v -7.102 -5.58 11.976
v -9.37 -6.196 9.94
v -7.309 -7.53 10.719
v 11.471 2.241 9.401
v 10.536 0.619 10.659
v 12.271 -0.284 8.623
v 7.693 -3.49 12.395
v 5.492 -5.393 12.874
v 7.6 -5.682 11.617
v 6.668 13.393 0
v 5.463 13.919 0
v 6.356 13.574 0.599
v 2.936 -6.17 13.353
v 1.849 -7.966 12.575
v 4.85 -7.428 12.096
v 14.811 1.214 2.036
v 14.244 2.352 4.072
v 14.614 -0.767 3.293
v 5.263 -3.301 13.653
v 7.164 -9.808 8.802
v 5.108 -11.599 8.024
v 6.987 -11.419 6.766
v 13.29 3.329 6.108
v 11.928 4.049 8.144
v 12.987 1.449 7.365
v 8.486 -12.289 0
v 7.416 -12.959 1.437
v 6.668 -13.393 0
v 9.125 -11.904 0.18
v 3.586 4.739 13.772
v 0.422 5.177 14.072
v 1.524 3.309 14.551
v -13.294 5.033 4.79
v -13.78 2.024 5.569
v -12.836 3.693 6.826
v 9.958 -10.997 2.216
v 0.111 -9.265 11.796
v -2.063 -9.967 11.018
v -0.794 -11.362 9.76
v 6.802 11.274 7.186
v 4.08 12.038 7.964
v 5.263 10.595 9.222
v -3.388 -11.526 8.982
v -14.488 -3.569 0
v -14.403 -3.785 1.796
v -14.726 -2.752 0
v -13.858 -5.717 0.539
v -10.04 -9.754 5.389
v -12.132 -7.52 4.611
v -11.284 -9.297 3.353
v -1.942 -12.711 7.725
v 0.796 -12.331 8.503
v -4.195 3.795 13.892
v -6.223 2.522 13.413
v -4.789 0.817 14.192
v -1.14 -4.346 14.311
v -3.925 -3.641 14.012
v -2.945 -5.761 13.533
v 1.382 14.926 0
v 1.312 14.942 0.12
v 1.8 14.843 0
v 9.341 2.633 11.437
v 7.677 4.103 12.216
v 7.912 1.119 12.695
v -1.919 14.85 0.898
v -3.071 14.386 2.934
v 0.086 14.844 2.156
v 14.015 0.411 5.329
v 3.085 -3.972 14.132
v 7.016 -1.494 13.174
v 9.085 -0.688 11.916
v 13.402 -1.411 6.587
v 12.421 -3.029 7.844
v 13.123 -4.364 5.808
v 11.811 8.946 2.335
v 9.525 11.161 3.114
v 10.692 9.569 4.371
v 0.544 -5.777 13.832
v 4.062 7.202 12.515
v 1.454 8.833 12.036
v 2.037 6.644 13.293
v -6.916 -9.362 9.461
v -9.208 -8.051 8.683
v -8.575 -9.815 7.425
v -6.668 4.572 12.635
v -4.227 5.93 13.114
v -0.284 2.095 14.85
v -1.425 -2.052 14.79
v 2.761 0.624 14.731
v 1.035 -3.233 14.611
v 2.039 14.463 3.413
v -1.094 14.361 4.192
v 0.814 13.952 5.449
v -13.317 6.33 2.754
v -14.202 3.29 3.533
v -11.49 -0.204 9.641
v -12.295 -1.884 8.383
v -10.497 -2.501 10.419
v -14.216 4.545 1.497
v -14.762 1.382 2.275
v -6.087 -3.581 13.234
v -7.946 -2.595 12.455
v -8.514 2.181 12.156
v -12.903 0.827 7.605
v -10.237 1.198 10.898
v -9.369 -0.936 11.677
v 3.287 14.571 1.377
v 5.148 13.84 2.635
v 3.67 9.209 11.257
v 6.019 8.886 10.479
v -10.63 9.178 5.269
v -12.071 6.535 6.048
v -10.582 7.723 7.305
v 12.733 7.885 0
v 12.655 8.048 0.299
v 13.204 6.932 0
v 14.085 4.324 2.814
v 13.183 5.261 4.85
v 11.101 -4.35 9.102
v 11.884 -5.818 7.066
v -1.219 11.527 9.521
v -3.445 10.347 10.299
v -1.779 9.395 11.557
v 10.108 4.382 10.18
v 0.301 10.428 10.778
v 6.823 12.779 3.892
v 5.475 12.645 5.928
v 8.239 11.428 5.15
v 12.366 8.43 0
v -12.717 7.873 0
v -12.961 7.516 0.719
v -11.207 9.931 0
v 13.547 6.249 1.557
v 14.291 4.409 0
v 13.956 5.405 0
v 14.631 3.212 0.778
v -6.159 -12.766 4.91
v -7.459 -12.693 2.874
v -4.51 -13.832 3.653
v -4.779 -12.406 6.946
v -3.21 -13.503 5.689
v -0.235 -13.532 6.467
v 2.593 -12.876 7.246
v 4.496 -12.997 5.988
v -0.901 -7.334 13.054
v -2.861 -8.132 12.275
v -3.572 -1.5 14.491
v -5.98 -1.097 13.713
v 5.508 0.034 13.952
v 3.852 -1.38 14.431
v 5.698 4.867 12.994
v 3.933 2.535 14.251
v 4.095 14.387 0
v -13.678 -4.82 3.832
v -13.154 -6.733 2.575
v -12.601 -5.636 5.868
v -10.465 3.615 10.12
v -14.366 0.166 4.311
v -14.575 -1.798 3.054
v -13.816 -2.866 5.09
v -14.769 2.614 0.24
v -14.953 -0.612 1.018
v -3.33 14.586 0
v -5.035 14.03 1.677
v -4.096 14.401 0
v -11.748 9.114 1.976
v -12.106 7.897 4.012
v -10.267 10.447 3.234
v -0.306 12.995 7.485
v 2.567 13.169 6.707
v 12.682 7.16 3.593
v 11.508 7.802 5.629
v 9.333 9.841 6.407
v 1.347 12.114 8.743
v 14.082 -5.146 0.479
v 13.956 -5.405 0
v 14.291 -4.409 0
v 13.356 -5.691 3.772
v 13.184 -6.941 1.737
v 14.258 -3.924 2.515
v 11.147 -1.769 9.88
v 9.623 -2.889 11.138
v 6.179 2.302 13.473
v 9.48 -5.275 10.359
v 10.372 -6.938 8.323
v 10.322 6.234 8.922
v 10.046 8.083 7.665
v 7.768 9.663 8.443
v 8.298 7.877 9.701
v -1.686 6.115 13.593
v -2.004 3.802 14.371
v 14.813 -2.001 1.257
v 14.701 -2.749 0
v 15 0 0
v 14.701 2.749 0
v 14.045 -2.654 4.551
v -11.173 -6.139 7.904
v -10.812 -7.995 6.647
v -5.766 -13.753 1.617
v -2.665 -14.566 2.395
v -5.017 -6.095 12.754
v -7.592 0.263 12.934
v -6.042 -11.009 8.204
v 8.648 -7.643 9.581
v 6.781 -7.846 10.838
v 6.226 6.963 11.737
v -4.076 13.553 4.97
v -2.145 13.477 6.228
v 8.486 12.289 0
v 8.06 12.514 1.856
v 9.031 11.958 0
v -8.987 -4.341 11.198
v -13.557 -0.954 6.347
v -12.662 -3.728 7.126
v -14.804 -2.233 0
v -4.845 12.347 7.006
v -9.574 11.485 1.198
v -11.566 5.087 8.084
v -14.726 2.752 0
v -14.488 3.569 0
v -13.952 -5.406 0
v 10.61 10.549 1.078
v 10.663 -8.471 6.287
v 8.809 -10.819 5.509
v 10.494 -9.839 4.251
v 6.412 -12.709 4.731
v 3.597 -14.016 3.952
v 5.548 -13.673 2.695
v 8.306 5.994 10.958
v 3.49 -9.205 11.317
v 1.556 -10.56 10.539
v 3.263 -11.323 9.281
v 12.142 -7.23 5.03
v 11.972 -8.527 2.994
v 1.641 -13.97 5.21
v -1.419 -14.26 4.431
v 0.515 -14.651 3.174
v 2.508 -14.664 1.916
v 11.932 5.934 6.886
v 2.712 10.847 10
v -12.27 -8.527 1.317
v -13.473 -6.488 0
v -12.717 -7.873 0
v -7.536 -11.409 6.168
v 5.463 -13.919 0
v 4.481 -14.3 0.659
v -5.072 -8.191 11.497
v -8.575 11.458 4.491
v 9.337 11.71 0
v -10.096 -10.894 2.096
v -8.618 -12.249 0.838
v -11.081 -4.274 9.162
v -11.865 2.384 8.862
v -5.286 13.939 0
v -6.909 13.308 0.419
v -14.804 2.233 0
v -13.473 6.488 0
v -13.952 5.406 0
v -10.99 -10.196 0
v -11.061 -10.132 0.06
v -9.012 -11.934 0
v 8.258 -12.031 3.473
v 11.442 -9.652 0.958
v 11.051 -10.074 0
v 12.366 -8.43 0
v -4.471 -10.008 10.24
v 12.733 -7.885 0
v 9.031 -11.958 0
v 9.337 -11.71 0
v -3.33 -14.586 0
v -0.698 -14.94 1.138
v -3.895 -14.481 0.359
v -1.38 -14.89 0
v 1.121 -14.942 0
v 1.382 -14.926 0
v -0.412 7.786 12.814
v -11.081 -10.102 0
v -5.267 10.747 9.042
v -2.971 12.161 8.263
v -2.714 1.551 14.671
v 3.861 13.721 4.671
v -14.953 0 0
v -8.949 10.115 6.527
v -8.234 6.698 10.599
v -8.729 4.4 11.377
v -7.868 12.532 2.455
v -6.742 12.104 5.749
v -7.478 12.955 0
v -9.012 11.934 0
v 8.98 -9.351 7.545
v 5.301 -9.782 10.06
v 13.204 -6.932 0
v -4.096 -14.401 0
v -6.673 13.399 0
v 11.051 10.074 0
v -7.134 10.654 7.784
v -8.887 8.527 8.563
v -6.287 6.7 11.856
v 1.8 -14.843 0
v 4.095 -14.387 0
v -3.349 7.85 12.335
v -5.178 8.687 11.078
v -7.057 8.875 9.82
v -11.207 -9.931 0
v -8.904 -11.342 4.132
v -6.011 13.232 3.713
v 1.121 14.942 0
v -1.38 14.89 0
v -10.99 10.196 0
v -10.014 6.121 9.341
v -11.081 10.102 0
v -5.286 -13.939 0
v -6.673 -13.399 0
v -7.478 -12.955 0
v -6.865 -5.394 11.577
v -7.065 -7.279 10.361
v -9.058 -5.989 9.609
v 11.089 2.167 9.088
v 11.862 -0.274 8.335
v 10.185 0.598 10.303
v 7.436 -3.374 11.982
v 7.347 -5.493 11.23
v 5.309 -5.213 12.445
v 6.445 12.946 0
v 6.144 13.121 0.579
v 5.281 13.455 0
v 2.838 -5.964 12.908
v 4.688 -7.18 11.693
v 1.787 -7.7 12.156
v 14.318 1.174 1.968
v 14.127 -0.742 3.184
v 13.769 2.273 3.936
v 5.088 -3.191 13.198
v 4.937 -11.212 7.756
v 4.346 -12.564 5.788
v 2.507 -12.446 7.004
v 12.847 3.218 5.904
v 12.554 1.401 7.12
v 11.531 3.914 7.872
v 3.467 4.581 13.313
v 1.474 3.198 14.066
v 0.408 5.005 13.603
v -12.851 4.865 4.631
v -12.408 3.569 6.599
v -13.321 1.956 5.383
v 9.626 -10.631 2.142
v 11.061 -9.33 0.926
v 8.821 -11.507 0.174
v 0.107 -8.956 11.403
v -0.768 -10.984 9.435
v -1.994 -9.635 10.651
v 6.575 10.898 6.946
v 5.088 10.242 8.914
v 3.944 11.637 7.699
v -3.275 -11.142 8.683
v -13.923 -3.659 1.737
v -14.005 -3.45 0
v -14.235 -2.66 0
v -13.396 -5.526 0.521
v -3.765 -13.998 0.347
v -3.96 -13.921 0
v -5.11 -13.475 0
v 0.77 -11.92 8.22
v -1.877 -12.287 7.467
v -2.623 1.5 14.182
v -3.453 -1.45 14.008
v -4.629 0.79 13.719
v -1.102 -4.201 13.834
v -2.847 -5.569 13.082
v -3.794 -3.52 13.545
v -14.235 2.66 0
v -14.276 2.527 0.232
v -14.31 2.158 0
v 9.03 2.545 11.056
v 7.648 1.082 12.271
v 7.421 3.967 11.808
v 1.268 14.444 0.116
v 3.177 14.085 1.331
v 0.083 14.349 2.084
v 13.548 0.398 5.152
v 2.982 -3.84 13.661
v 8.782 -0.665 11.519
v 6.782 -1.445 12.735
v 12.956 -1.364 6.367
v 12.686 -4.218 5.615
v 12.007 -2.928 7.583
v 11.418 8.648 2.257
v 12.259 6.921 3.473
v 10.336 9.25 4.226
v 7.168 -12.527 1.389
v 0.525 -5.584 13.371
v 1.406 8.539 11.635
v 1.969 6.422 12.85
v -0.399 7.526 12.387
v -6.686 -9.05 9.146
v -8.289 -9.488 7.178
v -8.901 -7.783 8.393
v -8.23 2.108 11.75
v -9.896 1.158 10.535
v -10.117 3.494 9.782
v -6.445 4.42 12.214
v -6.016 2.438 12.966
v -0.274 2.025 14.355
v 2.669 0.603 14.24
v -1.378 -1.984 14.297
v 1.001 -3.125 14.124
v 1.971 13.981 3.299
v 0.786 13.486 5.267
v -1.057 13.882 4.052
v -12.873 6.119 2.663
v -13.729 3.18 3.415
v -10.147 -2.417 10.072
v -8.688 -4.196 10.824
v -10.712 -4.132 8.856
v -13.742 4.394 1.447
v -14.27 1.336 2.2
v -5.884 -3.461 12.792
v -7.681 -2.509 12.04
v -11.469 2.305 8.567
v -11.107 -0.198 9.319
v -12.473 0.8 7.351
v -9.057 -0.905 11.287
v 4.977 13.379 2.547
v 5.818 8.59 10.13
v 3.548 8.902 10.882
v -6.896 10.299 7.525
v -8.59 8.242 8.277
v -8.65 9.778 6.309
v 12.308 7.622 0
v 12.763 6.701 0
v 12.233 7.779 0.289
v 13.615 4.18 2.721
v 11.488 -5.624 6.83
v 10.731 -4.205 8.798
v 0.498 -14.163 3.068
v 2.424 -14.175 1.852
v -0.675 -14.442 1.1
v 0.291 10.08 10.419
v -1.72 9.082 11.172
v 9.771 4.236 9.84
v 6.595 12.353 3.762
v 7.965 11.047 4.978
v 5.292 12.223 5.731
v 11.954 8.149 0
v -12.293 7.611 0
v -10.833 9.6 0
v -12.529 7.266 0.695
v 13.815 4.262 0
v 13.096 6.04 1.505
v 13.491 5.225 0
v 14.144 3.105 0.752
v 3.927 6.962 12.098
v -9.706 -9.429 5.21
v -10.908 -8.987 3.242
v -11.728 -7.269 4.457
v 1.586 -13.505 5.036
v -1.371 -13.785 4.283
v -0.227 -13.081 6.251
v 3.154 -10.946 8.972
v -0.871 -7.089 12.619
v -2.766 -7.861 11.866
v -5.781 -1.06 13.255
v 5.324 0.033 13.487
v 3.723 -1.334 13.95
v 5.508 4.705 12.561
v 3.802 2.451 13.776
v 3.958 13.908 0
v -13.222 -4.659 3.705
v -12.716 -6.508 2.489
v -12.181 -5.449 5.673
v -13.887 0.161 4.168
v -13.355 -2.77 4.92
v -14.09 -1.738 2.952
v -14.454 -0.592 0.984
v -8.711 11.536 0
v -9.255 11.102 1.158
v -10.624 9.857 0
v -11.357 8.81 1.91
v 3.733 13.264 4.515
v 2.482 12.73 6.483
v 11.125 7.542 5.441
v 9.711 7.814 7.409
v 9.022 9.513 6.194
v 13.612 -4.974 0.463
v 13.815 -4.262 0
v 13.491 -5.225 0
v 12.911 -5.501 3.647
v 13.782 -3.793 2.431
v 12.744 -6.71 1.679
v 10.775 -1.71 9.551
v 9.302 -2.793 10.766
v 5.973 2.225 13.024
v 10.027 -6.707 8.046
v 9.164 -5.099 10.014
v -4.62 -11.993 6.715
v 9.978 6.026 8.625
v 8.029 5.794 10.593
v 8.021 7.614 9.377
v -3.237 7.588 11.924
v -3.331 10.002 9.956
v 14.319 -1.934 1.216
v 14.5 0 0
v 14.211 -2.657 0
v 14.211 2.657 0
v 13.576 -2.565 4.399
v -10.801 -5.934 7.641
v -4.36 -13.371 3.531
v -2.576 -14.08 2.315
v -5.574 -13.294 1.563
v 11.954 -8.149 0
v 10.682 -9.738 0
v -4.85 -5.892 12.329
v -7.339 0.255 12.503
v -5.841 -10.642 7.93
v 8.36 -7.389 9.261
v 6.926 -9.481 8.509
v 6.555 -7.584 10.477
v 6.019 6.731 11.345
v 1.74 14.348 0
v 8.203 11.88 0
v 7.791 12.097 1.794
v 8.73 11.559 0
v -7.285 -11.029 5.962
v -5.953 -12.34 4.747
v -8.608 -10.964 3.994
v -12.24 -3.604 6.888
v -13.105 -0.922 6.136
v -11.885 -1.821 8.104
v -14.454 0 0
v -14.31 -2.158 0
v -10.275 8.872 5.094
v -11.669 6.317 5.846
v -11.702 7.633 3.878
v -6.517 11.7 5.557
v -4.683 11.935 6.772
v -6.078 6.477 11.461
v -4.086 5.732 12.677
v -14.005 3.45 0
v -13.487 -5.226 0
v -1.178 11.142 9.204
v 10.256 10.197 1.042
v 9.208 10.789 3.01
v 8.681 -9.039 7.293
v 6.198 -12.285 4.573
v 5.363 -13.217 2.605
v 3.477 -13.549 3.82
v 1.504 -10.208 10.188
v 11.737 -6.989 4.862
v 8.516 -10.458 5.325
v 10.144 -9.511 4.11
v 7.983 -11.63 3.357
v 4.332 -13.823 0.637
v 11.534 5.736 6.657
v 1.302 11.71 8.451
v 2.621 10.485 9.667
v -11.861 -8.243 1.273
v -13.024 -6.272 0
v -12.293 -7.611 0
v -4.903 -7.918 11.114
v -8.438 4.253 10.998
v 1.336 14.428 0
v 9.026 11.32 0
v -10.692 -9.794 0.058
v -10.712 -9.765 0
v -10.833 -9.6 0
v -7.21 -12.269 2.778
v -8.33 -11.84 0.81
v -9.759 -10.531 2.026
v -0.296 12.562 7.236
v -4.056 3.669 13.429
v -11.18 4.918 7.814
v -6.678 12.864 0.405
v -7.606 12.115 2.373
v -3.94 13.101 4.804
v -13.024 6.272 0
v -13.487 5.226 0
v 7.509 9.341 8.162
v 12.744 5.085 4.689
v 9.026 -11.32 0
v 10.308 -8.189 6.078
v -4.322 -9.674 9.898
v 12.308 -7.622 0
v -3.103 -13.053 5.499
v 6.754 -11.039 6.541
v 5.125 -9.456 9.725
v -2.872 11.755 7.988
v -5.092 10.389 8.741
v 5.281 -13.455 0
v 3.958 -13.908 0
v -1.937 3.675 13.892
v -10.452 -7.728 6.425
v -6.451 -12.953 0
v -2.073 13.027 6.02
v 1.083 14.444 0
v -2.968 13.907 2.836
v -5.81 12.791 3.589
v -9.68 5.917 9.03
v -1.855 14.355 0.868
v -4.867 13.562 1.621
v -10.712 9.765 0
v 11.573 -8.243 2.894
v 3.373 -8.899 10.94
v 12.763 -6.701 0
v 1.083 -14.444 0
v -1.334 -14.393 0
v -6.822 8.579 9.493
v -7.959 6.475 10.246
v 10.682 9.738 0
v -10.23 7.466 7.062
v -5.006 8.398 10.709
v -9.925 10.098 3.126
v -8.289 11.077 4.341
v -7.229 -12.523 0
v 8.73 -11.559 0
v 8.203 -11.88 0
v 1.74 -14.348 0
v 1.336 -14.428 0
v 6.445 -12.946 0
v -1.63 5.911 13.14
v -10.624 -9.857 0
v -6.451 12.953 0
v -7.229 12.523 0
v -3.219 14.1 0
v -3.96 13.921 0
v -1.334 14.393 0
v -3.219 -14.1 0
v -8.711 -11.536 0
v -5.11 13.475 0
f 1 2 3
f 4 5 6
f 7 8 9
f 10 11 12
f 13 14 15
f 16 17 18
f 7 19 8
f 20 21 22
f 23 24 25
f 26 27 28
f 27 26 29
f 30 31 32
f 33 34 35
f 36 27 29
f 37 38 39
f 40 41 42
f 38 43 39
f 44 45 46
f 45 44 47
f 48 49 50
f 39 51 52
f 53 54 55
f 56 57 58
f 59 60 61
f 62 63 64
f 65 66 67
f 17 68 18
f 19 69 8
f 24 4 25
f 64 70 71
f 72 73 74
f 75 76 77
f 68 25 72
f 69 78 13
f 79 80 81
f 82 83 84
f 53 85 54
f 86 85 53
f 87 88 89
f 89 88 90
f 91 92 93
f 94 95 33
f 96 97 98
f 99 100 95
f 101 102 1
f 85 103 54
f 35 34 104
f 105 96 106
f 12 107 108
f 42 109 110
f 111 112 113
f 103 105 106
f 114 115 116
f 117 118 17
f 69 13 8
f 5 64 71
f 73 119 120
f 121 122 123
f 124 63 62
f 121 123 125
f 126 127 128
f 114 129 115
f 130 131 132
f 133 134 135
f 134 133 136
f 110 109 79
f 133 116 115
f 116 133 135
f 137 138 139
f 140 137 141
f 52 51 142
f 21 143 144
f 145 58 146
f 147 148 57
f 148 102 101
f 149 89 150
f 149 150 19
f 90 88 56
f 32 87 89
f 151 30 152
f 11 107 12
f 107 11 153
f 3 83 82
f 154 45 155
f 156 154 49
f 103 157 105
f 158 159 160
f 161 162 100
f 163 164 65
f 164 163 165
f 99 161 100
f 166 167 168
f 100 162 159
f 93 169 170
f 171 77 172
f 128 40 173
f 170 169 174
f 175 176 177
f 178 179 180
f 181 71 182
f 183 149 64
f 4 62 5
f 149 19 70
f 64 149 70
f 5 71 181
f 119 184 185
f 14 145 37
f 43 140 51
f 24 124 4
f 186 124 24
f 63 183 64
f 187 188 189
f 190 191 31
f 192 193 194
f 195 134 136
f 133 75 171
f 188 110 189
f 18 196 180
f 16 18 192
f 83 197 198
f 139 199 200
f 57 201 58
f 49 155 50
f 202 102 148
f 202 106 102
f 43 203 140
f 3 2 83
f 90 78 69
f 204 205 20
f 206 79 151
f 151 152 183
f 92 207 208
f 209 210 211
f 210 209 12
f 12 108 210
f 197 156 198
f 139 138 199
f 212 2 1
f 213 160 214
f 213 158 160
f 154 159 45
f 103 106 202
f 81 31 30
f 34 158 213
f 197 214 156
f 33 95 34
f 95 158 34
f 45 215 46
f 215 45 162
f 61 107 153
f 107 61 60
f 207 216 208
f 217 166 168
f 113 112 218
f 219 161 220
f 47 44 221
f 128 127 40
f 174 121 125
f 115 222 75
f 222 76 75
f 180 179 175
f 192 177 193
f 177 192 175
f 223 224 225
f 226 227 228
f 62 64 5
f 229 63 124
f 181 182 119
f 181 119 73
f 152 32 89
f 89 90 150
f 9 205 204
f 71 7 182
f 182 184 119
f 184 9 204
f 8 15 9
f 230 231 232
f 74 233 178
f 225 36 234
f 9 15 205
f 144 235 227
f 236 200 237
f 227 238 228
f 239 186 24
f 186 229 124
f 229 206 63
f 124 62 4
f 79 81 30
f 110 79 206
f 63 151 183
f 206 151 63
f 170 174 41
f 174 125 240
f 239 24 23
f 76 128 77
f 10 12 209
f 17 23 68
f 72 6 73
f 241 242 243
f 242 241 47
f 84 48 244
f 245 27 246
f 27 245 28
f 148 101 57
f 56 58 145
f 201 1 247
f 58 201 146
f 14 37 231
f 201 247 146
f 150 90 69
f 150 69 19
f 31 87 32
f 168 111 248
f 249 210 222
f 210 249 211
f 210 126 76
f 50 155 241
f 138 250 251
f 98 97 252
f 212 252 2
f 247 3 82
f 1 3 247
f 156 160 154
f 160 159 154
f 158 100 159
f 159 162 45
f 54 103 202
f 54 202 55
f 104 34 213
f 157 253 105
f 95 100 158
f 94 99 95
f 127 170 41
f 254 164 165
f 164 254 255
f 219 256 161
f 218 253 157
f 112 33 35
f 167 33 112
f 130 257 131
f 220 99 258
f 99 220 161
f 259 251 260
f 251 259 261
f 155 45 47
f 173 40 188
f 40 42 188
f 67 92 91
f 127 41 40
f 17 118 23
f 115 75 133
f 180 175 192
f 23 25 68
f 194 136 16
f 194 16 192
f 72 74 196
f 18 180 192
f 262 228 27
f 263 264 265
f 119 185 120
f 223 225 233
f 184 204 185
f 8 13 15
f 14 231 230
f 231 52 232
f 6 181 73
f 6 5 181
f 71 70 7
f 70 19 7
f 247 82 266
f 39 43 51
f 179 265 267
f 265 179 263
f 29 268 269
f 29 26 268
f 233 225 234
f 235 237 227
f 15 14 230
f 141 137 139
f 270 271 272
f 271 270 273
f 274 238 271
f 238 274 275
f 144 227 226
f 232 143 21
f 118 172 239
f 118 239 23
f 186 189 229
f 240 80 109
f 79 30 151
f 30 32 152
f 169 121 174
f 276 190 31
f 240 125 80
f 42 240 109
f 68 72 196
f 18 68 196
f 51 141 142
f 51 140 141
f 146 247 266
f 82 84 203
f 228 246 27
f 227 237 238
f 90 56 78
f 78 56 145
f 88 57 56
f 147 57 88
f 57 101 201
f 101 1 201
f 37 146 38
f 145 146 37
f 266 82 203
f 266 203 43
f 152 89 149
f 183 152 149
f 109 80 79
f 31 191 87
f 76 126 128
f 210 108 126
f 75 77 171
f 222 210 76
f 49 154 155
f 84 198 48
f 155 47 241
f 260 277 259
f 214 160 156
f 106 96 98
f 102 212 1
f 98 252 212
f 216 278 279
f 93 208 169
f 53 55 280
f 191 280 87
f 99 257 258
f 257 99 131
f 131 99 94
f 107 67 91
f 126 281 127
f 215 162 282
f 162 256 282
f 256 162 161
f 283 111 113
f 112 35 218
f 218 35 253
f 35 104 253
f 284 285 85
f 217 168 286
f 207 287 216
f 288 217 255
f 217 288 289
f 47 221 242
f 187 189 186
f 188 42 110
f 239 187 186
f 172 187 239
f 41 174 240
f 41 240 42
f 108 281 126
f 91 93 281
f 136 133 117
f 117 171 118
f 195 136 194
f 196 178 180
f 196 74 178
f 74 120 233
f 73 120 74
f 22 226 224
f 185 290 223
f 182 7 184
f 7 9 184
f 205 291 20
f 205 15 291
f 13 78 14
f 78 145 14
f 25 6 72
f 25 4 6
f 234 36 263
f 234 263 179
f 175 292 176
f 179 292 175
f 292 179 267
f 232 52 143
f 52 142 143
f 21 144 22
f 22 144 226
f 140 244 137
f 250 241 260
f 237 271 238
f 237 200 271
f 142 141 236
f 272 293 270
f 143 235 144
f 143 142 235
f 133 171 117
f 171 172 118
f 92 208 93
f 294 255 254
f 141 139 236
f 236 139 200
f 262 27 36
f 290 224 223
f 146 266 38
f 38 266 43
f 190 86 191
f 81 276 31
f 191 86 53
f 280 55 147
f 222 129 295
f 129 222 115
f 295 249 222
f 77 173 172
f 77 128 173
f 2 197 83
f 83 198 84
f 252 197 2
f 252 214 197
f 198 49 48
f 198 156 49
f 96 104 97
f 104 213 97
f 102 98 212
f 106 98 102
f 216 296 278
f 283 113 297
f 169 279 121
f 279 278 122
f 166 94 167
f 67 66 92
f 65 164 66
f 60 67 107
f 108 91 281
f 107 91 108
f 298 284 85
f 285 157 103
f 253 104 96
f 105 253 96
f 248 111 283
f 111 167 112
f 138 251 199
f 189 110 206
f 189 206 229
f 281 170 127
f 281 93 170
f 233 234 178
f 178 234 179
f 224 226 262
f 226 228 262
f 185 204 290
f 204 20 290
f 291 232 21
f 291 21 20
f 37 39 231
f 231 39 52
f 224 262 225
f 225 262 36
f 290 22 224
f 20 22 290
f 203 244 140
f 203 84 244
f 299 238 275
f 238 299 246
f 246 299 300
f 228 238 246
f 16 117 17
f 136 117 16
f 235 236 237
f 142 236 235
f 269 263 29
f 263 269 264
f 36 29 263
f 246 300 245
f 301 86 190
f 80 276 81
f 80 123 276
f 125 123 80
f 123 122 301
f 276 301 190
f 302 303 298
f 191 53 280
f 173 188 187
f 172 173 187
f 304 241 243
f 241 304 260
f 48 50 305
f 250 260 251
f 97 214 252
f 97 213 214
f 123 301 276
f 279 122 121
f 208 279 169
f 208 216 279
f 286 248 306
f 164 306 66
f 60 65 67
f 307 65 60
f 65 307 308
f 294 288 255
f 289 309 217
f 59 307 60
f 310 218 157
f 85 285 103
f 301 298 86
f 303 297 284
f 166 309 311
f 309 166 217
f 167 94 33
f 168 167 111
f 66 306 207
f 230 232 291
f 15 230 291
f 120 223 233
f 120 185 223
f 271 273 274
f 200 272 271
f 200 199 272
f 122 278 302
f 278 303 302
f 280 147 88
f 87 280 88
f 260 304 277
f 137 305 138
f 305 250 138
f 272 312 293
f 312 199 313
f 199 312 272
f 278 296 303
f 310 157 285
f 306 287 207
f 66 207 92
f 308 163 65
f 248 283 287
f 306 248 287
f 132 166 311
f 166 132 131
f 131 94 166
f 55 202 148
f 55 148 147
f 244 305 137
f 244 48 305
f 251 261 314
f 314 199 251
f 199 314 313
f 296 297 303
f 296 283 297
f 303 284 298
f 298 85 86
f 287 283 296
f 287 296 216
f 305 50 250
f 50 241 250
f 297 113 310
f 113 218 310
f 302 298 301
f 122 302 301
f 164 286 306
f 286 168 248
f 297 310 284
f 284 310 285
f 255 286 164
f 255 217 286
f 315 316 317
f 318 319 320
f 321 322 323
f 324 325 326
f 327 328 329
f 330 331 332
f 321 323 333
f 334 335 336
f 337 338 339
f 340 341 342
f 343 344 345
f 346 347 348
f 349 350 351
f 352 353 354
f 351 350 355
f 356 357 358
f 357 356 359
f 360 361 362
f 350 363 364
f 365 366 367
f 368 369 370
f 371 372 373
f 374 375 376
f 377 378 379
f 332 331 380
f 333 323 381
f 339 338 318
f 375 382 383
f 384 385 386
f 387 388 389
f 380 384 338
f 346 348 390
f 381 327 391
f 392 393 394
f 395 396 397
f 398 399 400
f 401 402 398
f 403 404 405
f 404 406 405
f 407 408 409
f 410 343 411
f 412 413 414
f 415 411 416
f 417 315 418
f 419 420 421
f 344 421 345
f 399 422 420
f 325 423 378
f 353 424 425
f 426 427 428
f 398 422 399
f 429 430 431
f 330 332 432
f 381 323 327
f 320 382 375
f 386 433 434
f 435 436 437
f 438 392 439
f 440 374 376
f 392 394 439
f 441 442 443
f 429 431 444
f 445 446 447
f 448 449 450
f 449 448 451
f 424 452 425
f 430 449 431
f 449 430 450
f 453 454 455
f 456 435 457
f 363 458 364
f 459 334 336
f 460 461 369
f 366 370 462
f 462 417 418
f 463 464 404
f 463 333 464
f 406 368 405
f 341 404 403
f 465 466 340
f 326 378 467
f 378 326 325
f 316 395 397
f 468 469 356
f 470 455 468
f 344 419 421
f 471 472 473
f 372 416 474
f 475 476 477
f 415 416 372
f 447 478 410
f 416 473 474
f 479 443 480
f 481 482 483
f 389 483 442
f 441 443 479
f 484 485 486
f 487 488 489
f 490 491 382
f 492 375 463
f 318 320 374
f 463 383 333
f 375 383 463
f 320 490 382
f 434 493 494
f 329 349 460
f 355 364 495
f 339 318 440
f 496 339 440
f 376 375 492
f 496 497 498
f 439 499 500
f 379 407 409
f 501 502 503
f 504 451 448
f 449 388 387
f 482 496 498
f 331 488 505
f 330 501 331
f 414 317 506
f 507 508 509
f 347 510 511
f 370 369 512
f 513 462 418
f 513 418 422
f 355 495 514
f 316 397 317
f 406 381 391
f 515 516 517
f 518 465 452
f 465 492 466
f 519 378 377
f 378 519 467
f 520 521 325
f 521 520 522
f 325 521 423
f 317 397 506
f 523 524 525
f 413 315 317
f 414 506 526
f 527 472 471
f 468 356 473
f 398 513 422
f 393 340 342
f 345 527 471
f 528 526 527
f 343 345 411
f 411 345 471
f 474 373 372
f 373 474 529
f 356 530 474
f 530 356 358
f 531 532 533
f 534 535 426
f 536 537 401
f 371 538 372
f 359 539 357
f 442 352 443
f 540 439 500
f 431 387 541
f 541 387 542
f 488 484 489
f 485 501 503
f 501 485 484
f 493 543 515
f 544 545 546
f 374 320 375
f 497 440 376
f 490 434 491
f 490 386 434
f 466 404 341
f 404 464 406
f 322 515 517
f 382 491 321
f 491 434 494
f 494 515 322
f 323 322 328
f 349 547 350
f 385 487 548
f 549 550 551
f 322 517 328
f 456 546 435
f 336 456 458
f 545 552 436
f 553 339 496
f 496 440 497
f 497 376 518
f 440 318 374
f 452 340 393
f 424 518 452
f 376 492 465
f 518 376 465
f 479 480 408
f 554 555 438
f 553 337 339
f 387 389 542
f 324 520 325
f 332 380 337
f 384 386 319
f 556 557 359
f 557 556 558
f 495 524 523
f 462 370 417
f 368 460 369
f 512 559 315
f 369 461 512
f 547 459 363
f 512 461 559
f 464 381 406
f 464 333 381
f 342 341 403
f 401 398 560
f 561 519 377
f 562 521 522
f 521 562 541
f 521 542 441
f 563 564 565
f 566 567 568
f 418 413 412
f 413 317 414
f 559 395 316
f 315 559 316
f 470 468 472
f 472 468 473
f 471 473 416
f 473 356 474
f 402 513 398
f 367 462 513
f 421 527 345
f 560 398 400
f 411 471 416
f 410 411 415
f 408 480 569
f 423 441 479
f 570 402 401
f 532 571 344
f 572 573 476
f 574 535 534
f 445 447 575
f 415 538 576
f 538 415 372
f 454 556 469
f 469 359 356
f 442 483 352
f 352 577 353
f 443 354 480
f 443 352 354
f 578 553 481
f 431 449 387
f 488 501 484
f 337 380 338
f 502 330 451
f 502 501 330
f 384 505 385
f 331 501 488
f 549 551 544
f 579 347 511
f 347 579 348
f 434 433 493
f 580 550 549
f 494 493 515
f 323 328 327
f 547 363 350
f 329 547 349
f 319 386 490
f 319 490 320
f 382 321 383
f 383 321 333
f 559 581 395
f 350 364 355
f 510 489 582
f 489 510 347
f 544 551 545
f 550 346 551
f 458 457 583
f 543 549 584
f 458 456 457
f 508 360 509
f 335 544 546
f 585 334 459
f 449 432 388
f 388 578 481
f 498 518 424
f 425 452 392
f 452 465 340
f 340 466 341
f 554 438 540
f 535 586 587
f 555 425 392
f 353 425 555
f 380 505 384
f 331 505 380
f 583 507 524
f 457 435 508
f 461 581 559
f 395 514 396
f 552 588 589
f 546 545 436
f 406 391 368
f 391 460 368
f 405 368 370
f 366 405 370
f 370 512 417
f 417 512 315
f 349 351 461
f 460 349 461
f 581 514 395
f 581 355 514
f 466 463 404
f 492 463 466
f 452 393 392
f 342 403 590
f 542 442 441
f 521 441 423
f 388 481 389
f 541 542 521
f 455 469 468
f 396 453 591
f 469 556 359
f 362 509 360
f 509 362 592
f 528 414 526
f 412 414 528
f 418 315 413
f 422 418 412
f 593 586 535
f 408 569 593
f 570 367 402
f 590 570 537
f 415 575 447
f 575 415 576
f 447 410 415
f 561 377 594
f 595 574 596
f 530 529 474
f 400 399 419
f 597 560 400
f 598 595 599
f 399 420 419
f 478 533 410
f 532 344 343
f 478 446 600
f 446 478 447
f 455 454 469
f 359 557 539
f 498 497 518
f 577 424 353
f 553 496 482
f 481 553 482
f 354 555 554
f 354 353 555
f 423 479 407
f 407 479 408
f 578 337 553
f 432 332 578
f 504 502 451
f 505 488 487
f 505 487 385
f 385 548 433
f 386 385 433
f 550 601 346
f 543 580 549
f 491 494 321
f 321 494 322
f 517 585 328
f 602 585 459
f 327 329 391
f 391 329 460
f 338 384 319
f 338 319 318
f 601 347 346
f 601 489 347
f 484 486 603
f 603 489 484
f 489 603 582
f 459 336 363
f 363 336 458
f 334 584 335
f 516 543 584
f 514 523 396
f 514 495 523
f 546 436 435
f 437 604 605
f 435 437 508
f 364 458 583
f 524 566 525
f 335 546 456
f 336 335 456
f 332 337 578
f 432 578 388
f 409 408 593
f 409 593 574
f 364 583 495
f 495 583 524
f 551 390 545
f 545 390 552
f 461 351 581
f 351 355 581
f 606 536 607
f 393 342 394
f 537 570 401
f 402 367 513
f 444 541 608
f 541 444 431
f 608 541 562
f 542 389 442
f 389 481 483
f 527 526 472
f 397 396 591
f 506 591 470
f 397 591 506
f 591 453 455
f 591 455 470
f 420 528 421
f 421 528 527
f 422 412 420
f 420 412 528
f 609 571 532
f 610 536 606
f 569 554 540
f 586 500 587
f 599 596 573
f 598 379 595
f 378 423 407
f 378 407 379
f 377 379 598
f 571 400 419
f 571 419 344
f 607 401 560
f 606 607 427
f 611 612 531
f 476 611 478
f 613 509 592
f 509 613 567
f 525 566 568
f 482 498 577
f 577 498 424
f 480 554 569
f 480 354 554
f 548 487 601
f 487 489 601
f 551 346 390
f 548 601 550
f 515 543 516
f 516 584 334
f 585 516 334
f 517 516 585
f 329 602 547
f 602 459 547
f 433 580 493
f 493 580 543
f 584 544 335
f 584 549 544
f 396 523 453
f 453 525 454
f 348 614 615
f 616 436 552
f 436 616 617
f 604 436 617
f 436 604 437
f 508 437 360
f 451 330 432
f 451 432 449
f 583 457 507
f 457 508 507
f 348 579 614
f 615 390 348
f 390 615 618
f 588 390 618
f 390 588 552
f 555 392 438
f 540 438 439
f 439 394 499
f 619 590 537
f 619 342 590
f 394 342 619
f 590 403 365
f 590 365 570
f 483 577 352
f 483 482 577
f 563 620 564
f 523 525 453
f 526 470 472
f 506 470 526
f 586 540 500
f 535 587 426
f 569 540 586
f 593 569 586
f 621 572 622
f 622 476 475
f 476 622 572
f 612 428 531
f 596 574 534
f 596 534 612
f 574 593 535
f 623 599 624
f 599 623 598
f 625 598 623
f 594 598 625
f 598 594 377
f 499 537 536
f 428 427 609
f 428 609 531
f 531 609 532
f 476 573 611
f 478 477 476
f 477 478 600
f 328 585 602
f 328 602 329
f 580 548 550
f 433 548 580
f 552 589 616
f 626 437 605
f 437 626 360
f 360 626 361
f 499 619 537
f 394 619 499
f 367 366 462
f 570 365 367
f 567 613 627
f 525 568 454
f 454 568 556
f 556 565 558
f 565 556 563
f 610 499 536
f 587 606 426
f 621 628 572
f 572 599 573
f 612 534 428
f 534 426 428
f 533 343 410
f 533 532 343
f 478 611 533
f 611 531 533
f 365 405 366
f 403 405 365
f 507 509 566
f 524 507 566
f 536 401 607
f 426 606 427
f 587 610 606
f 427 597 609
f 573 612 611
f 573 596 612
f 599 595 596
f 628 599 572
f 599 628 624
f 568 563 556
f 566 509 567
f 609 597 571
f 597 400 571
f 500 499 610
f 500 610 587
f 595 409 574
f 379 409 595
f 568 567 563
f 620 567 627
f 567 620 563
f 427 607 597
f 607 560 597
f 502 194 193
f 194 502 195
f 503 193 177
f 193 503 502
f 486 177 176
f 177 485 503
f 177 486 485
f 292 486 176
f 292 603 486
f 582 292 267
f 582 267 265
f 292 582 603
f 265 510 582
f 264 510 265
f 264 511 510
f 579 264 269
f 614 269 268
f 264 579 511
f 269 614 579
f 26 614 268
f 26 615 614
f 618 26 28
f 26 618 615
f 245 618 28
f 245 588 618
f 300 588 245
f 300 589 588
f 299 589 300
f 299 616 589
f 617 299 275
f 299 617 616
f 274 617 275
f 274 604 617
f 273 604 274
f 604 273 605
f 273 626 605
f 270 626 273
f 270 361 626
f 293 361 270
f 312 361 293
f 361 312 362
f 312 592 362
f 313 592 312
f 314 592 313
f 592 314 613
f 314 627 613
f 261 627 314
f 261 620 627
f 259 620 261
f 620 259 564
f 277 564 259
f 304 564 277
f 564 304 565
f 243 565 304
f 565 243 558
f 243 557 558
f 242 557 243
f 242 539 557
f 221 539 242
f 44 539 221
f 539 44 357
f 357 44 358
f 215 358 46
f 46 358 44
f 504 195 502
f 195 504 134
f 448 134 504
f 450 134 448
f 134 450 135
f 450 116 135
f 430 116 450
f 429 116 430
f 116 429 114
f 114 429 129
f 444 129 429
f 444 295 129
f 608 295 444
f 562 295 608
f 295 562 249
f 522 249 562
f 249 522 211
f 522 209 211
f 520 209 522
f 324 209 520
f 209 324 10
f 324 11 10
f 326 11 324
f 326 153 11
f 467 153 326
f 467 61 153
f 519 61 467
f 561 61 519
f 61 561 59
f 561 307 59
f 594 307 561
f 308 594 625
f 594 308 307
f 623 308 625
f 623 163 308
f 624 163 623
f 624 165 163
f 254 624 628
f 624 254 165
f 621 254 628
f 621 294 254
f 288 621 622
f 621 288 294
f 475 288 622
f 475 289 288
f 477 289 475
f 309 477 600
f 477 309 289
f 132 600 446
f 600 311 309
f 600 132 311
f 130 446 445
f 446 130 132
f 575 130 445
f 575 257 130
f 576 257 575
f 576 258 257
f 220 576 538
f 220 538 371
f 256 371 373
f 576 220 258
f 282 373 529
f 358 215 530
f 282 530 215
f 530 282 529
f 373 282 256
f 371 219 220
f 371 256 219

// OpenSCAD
// file: external/fibsphere/files/fibonacci_sphere.scad
fibonacci_sphere(50,n=10000);
module fibonacci_sphere(r, n, $fn){
    $n = n==undef? ceil((0.5*$fn*$fn)/2) : n;
    hull()
    polyhedron(points = [
        for(i=[-$n:($n-2)])
            r * _pos(i,$n)
    ], faces=[
        for(i=[0:3:2*$n])
            [i,i+1,i+2]
        // for(i=[-$n:3:($n-2)])
        //     [i+$n,i+1+$n,i+2+$n]
    ]);
}

//calculates ith vertex position on a fibonacci unit sphere of 2*n vertices
function _pos(i, n) =
	[cos(_lon(i)) * _xy(_z(i,n)), 
	 sin(_lon(i)) * _xy(_z(i,n)), 
	 _z(i,n)];

function _lon(i) = _golden_angle*i;
function _z(i,n) = 2*i/(2*n+1);
function _xy(z)  = sqrt(1-pow(z,2));

_golden_ratio = 1.61803;
_golden_angle = 360 * _golden_ratio; 
// main file
use <external/fibsphere/files/fibonacci_sphere.scad>

difference () {
  fibonacci_sphere(15, 250);

  fibonacci_sphere(14.5, 250);

  translate([0, 0, -20])
  cube ([40, 40, 40], center = true);
}
